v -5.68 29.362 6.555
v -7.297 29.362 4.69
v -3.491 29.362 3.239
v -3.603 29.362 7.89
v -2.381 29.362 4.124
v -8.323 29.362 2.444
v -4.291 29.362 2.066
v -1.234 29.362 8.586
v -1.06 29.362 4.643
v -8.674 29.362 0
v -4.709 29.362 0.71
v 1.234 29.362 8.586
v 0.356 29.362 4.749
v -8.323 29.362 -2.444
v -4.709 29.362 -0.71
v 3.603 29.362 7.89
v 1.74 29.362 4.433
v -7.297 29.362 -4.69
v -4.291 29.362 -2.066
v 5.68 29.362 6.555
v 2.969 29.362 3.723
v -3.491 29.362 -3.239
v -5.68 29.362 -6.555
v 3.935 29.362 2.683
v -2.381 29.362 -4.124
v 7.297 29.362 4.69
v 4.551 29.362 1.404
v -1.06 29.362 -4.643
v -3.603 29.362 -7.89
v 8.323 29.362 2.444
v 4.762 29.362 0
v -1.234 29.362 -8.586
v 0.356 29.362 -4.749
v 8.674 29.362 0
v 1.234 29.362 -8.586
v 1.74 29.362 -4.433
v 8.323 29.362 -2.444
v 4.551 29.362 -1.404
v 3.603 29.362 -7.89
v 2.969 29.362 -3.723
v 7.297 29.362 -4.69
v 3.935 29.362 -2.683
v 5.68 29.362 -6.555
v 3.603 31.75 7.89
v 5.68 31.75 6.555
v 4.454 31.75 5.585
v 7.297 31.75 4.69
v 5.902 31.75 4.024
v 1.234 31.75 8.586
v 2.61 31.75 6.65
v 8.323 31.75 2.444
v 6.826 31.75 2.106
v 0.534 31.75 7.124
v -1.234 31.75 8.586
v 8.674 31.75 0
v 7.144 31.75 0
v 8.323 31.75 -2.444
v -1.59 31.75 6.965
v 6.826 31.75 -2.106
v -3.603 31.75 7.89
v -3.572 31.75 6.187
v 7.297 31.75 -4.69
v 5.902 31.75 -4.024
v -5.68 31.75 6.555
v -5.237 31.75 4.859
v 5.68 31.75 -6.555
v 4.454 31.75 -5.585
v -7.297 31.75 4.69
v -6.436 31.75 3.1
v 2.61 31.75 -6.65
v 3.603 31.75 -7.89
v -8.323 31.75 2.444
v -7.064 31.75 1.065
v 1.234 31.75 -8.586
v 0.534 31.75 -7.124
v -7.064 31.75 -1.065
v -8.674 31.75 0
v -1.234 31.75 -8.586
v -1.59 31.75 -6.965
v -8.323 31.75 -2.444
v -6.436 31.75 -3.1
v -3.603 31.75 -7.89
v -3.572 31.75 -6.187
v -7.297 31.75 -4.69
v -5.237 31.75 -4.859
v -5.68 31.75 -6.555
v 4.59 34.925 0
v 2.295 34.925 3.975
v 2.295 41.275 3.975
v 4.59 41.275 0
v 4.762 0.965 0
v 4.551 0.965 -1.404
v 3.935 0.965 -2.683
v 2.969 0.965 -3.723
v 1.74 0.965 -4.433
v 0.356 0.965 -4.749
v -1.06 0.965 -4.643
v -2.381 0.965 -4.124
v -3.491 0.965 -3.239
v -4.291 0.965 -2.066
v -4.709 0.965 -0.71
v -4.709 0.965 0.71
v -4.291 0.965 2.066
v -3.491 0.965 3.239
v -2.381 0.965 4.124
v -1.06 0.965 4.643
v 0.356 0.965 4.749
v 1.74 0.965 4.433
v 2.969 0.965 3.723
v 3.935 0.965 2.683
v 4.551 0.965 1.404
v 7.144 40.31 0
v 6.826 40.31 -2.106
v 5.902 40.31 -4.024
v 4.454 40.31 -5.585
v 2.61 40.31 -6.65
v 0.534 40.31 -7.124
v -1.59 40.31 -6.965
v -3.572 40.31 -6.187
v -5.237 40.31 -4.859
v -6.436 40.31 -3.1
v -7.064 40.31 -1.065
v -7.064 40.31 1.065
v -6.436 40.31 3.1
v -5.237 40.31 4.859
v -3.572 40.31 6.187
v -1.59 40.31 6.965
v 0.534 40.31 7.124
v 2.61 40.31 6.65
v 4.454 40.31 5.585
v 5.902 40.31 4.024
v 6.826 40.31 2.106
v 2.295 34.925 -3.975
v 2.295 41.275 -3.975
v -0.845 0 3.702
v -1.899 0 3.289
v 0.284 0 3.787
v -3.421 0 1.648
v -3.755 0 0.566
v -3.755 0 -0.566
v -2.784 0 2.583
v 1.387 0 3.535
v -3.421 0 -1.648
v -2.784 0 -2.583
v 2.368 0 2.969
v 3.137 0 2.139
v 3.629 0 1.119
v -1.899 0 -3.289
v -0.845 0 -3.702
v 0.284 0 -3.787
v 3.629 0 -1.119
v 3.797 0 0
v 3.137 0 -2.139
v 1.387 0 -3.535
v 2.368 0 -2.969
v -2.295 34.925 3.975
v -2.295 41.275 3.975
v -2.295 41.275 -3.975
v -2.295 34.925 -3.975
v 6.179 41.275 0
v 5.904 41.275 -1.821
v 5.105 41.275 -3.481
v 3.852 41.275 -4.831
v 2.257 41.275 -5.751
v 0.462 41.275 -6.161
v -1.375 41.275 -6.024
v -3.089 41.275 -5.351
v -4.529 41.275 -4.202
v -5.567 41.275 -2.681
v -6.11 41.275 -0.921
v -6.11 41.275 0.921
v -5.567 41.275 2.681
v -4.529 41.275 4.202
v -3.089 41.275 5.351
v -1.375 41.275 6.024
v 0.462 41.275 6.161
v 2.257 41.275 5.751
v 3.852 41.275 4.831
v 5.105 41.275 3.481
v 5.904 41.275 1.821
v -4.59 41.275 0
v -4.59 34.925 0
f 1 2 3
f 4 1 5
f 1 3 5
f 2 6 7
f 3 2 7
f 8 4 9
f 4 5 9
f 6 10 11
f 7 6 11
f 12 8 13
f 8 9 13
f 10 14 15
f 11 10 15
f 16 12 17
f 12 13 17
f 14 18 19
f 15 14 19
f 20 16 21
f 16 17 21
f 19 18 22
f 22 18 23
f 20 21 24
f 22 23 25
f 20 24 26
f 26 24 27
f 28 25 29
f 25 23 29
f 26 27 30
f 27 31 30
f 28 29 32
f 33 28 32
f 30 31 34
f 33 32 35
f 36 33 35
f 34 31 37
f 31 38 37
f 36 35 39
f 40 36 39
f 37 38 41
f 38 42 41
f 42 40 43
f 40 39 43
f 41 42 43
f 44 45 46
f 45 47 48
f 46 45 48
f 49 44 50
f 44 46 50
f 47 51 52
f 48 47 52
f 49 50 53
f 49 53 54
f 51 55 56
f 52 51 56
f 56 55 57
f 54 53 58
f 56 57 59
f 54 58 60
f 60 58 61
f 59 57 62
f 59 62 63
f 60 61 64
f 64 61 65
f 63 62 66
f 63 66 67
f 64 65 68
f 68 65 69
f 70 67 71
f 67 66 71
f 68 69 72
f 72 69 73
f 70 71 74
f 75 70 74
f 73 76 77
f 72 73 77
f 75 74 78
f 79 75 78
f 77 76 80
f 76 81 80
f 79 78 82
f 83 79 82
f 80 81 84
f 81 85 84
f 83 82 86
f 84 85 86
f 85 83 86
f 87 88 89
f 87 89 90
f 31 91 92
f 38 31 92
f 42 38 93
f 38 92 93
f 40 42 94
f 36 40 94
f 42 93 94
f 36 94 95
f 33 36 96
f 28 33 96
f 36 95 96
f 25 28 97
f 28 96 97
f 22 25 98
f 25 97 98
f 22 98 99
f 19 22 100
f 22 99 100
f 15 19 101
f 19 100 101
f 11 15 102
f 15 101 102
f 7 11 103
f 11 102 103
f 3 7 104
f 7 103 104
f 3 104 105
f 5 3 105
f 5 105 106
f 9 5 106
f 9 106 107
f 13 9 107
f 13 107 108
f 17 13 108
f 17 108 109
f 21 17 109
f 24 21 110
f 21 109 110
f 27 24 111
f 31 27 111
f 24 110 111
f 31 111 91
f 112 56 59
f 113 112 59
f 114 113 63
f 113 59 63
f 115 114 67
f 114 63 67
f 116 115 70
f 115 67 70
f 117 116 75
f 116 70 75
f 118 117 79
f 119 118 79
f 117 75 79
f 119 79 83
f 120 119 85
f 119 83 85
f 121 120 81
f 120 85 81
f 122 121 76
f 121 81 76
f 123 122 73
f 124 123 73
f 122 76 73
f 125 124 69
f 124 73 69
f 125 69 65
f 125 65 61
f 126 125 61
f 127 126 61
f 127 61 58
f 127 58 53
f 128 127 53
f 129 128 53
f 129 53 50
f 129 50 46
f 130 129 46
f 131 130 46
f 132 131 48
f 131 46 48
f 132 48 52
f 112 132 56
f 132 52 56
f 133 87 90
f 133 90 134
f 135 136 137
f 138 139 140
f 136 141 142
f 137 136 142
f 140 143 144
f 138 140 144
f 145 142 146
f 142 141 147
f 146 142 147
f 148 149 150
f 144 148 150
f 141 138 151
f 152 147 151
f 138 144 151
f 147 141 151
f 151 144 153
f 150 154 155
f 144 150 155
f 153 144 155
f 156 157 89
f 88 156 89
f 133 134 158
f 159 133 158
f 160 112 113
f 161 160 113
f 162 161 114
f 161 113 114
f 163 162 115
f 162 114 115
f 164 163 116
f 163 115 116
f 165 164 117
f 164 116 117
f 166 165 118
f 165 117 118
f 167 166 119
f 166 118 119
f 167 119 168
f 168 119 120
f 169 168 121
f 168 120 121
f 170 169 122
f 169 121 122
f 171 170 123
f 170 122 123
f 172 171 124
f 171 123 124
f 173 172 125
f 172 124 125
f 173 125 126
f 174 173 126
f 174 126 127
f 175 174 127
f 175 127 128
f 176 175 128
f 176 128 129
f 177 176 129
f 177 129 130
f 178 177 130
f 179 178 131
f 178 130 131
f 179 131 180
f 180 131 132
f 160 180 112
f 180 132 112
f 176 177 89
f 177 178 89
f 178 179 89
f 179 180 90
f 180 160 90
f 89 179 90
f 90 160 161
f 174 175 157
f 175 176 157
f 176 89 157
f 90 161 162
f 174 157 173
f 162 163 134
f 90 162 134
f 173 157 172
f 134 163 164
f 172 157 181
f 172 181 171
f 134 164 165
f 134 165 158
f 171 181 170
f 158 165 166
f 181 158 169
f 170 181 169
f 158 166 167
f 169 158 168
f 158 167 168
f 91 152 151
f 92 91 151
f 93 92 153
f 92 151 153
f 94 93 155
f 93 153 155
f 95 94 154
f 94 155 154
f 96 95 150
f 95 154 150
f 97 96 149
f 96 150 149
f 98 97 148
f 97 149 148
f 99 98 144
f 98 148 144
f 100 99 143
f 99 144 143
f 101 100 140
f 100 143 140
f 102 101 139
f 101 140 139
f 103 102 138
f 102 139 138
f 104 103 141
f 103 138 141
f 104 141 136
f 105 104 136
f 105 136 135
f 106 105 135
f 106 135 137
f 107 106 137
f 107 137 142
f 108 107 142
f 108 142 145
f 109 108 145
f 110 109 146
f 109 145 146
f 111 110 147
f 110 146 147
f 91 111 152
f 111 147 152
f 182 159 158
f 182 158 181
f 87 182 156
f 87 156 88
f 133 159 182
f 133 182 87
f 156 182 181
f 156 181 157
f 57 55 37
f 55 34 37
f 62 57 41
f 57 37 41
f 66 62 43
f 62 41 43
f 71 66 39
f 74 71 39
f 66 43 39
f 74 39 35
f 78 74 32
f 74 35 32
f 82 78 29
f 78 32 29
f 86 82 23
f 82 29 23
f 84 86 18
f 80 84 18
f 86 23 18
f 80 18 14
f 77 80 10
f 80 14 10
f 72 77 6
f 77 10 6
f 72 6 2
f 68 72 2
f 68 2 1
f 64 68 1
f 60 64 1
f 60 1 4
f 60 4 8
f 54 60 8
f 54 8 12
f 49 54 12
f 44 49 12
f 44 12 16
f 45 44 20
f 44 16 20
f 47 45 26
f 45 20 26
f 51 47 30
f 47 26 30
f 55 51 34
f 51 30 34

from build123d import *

# Parameters (mm, degrees)
CUT_EXTRUDE1_DEPTH = 6.35
CHAMFER1_SIZE      = 0.9652
CHAMFER2_SIZE      = 0.9652


with BuildPart() as part:
    # Sketch2 → Revolve1 (revolve)
    with BuildSketch(Plane.XY):
        Polygon((0, 41.275), (7.14375, 41.275), (7.14375, 31.75), (8.6741, 31.75), (8.6741, 29.3624), (4.7625, 29.3624), (4.7625, 0), (0, 0), align=None)
    revolve(axis=Axis((0, 0, 0), (0, 1, 0)))

    # Sketch3 → Cut-Extrude1 (cut)
    with BuildSketch(Plane(origin=(0, 41.275, 0), x_dir=(1, 0, 0), z_dir=(0, 1, 0))):
        Polygon((4.59005011, 0), (2.295025055, 3.9751), (-2.295025055, 3.9751), (-4.59005011, 0), (-2.295025055, -3.9751), (2.295025055, -3.9751), align=None)
    extrude(amount=-CUT_EXTRUDE1_DEPTH, mode=Mode.SUBTRACT)

    # Chamfer1
    chamfer1_edges = [part.edges().sort_by_distance(p)[0] for p in [
        (-7.14375, 41.275, 0),
    ]]
    chamfer(chamfer1_edges, length=CHAMFER1_SIZE)

    # Chamfer2
    chamfer2_edges = [part.edges().sort_by_distance(p)[0] for p in [
        (-4.7625, 0, 0),
    ]]
    chamfer(chamfer2_edges, length=CHAMFER2_SIZE)


solid = part.part
